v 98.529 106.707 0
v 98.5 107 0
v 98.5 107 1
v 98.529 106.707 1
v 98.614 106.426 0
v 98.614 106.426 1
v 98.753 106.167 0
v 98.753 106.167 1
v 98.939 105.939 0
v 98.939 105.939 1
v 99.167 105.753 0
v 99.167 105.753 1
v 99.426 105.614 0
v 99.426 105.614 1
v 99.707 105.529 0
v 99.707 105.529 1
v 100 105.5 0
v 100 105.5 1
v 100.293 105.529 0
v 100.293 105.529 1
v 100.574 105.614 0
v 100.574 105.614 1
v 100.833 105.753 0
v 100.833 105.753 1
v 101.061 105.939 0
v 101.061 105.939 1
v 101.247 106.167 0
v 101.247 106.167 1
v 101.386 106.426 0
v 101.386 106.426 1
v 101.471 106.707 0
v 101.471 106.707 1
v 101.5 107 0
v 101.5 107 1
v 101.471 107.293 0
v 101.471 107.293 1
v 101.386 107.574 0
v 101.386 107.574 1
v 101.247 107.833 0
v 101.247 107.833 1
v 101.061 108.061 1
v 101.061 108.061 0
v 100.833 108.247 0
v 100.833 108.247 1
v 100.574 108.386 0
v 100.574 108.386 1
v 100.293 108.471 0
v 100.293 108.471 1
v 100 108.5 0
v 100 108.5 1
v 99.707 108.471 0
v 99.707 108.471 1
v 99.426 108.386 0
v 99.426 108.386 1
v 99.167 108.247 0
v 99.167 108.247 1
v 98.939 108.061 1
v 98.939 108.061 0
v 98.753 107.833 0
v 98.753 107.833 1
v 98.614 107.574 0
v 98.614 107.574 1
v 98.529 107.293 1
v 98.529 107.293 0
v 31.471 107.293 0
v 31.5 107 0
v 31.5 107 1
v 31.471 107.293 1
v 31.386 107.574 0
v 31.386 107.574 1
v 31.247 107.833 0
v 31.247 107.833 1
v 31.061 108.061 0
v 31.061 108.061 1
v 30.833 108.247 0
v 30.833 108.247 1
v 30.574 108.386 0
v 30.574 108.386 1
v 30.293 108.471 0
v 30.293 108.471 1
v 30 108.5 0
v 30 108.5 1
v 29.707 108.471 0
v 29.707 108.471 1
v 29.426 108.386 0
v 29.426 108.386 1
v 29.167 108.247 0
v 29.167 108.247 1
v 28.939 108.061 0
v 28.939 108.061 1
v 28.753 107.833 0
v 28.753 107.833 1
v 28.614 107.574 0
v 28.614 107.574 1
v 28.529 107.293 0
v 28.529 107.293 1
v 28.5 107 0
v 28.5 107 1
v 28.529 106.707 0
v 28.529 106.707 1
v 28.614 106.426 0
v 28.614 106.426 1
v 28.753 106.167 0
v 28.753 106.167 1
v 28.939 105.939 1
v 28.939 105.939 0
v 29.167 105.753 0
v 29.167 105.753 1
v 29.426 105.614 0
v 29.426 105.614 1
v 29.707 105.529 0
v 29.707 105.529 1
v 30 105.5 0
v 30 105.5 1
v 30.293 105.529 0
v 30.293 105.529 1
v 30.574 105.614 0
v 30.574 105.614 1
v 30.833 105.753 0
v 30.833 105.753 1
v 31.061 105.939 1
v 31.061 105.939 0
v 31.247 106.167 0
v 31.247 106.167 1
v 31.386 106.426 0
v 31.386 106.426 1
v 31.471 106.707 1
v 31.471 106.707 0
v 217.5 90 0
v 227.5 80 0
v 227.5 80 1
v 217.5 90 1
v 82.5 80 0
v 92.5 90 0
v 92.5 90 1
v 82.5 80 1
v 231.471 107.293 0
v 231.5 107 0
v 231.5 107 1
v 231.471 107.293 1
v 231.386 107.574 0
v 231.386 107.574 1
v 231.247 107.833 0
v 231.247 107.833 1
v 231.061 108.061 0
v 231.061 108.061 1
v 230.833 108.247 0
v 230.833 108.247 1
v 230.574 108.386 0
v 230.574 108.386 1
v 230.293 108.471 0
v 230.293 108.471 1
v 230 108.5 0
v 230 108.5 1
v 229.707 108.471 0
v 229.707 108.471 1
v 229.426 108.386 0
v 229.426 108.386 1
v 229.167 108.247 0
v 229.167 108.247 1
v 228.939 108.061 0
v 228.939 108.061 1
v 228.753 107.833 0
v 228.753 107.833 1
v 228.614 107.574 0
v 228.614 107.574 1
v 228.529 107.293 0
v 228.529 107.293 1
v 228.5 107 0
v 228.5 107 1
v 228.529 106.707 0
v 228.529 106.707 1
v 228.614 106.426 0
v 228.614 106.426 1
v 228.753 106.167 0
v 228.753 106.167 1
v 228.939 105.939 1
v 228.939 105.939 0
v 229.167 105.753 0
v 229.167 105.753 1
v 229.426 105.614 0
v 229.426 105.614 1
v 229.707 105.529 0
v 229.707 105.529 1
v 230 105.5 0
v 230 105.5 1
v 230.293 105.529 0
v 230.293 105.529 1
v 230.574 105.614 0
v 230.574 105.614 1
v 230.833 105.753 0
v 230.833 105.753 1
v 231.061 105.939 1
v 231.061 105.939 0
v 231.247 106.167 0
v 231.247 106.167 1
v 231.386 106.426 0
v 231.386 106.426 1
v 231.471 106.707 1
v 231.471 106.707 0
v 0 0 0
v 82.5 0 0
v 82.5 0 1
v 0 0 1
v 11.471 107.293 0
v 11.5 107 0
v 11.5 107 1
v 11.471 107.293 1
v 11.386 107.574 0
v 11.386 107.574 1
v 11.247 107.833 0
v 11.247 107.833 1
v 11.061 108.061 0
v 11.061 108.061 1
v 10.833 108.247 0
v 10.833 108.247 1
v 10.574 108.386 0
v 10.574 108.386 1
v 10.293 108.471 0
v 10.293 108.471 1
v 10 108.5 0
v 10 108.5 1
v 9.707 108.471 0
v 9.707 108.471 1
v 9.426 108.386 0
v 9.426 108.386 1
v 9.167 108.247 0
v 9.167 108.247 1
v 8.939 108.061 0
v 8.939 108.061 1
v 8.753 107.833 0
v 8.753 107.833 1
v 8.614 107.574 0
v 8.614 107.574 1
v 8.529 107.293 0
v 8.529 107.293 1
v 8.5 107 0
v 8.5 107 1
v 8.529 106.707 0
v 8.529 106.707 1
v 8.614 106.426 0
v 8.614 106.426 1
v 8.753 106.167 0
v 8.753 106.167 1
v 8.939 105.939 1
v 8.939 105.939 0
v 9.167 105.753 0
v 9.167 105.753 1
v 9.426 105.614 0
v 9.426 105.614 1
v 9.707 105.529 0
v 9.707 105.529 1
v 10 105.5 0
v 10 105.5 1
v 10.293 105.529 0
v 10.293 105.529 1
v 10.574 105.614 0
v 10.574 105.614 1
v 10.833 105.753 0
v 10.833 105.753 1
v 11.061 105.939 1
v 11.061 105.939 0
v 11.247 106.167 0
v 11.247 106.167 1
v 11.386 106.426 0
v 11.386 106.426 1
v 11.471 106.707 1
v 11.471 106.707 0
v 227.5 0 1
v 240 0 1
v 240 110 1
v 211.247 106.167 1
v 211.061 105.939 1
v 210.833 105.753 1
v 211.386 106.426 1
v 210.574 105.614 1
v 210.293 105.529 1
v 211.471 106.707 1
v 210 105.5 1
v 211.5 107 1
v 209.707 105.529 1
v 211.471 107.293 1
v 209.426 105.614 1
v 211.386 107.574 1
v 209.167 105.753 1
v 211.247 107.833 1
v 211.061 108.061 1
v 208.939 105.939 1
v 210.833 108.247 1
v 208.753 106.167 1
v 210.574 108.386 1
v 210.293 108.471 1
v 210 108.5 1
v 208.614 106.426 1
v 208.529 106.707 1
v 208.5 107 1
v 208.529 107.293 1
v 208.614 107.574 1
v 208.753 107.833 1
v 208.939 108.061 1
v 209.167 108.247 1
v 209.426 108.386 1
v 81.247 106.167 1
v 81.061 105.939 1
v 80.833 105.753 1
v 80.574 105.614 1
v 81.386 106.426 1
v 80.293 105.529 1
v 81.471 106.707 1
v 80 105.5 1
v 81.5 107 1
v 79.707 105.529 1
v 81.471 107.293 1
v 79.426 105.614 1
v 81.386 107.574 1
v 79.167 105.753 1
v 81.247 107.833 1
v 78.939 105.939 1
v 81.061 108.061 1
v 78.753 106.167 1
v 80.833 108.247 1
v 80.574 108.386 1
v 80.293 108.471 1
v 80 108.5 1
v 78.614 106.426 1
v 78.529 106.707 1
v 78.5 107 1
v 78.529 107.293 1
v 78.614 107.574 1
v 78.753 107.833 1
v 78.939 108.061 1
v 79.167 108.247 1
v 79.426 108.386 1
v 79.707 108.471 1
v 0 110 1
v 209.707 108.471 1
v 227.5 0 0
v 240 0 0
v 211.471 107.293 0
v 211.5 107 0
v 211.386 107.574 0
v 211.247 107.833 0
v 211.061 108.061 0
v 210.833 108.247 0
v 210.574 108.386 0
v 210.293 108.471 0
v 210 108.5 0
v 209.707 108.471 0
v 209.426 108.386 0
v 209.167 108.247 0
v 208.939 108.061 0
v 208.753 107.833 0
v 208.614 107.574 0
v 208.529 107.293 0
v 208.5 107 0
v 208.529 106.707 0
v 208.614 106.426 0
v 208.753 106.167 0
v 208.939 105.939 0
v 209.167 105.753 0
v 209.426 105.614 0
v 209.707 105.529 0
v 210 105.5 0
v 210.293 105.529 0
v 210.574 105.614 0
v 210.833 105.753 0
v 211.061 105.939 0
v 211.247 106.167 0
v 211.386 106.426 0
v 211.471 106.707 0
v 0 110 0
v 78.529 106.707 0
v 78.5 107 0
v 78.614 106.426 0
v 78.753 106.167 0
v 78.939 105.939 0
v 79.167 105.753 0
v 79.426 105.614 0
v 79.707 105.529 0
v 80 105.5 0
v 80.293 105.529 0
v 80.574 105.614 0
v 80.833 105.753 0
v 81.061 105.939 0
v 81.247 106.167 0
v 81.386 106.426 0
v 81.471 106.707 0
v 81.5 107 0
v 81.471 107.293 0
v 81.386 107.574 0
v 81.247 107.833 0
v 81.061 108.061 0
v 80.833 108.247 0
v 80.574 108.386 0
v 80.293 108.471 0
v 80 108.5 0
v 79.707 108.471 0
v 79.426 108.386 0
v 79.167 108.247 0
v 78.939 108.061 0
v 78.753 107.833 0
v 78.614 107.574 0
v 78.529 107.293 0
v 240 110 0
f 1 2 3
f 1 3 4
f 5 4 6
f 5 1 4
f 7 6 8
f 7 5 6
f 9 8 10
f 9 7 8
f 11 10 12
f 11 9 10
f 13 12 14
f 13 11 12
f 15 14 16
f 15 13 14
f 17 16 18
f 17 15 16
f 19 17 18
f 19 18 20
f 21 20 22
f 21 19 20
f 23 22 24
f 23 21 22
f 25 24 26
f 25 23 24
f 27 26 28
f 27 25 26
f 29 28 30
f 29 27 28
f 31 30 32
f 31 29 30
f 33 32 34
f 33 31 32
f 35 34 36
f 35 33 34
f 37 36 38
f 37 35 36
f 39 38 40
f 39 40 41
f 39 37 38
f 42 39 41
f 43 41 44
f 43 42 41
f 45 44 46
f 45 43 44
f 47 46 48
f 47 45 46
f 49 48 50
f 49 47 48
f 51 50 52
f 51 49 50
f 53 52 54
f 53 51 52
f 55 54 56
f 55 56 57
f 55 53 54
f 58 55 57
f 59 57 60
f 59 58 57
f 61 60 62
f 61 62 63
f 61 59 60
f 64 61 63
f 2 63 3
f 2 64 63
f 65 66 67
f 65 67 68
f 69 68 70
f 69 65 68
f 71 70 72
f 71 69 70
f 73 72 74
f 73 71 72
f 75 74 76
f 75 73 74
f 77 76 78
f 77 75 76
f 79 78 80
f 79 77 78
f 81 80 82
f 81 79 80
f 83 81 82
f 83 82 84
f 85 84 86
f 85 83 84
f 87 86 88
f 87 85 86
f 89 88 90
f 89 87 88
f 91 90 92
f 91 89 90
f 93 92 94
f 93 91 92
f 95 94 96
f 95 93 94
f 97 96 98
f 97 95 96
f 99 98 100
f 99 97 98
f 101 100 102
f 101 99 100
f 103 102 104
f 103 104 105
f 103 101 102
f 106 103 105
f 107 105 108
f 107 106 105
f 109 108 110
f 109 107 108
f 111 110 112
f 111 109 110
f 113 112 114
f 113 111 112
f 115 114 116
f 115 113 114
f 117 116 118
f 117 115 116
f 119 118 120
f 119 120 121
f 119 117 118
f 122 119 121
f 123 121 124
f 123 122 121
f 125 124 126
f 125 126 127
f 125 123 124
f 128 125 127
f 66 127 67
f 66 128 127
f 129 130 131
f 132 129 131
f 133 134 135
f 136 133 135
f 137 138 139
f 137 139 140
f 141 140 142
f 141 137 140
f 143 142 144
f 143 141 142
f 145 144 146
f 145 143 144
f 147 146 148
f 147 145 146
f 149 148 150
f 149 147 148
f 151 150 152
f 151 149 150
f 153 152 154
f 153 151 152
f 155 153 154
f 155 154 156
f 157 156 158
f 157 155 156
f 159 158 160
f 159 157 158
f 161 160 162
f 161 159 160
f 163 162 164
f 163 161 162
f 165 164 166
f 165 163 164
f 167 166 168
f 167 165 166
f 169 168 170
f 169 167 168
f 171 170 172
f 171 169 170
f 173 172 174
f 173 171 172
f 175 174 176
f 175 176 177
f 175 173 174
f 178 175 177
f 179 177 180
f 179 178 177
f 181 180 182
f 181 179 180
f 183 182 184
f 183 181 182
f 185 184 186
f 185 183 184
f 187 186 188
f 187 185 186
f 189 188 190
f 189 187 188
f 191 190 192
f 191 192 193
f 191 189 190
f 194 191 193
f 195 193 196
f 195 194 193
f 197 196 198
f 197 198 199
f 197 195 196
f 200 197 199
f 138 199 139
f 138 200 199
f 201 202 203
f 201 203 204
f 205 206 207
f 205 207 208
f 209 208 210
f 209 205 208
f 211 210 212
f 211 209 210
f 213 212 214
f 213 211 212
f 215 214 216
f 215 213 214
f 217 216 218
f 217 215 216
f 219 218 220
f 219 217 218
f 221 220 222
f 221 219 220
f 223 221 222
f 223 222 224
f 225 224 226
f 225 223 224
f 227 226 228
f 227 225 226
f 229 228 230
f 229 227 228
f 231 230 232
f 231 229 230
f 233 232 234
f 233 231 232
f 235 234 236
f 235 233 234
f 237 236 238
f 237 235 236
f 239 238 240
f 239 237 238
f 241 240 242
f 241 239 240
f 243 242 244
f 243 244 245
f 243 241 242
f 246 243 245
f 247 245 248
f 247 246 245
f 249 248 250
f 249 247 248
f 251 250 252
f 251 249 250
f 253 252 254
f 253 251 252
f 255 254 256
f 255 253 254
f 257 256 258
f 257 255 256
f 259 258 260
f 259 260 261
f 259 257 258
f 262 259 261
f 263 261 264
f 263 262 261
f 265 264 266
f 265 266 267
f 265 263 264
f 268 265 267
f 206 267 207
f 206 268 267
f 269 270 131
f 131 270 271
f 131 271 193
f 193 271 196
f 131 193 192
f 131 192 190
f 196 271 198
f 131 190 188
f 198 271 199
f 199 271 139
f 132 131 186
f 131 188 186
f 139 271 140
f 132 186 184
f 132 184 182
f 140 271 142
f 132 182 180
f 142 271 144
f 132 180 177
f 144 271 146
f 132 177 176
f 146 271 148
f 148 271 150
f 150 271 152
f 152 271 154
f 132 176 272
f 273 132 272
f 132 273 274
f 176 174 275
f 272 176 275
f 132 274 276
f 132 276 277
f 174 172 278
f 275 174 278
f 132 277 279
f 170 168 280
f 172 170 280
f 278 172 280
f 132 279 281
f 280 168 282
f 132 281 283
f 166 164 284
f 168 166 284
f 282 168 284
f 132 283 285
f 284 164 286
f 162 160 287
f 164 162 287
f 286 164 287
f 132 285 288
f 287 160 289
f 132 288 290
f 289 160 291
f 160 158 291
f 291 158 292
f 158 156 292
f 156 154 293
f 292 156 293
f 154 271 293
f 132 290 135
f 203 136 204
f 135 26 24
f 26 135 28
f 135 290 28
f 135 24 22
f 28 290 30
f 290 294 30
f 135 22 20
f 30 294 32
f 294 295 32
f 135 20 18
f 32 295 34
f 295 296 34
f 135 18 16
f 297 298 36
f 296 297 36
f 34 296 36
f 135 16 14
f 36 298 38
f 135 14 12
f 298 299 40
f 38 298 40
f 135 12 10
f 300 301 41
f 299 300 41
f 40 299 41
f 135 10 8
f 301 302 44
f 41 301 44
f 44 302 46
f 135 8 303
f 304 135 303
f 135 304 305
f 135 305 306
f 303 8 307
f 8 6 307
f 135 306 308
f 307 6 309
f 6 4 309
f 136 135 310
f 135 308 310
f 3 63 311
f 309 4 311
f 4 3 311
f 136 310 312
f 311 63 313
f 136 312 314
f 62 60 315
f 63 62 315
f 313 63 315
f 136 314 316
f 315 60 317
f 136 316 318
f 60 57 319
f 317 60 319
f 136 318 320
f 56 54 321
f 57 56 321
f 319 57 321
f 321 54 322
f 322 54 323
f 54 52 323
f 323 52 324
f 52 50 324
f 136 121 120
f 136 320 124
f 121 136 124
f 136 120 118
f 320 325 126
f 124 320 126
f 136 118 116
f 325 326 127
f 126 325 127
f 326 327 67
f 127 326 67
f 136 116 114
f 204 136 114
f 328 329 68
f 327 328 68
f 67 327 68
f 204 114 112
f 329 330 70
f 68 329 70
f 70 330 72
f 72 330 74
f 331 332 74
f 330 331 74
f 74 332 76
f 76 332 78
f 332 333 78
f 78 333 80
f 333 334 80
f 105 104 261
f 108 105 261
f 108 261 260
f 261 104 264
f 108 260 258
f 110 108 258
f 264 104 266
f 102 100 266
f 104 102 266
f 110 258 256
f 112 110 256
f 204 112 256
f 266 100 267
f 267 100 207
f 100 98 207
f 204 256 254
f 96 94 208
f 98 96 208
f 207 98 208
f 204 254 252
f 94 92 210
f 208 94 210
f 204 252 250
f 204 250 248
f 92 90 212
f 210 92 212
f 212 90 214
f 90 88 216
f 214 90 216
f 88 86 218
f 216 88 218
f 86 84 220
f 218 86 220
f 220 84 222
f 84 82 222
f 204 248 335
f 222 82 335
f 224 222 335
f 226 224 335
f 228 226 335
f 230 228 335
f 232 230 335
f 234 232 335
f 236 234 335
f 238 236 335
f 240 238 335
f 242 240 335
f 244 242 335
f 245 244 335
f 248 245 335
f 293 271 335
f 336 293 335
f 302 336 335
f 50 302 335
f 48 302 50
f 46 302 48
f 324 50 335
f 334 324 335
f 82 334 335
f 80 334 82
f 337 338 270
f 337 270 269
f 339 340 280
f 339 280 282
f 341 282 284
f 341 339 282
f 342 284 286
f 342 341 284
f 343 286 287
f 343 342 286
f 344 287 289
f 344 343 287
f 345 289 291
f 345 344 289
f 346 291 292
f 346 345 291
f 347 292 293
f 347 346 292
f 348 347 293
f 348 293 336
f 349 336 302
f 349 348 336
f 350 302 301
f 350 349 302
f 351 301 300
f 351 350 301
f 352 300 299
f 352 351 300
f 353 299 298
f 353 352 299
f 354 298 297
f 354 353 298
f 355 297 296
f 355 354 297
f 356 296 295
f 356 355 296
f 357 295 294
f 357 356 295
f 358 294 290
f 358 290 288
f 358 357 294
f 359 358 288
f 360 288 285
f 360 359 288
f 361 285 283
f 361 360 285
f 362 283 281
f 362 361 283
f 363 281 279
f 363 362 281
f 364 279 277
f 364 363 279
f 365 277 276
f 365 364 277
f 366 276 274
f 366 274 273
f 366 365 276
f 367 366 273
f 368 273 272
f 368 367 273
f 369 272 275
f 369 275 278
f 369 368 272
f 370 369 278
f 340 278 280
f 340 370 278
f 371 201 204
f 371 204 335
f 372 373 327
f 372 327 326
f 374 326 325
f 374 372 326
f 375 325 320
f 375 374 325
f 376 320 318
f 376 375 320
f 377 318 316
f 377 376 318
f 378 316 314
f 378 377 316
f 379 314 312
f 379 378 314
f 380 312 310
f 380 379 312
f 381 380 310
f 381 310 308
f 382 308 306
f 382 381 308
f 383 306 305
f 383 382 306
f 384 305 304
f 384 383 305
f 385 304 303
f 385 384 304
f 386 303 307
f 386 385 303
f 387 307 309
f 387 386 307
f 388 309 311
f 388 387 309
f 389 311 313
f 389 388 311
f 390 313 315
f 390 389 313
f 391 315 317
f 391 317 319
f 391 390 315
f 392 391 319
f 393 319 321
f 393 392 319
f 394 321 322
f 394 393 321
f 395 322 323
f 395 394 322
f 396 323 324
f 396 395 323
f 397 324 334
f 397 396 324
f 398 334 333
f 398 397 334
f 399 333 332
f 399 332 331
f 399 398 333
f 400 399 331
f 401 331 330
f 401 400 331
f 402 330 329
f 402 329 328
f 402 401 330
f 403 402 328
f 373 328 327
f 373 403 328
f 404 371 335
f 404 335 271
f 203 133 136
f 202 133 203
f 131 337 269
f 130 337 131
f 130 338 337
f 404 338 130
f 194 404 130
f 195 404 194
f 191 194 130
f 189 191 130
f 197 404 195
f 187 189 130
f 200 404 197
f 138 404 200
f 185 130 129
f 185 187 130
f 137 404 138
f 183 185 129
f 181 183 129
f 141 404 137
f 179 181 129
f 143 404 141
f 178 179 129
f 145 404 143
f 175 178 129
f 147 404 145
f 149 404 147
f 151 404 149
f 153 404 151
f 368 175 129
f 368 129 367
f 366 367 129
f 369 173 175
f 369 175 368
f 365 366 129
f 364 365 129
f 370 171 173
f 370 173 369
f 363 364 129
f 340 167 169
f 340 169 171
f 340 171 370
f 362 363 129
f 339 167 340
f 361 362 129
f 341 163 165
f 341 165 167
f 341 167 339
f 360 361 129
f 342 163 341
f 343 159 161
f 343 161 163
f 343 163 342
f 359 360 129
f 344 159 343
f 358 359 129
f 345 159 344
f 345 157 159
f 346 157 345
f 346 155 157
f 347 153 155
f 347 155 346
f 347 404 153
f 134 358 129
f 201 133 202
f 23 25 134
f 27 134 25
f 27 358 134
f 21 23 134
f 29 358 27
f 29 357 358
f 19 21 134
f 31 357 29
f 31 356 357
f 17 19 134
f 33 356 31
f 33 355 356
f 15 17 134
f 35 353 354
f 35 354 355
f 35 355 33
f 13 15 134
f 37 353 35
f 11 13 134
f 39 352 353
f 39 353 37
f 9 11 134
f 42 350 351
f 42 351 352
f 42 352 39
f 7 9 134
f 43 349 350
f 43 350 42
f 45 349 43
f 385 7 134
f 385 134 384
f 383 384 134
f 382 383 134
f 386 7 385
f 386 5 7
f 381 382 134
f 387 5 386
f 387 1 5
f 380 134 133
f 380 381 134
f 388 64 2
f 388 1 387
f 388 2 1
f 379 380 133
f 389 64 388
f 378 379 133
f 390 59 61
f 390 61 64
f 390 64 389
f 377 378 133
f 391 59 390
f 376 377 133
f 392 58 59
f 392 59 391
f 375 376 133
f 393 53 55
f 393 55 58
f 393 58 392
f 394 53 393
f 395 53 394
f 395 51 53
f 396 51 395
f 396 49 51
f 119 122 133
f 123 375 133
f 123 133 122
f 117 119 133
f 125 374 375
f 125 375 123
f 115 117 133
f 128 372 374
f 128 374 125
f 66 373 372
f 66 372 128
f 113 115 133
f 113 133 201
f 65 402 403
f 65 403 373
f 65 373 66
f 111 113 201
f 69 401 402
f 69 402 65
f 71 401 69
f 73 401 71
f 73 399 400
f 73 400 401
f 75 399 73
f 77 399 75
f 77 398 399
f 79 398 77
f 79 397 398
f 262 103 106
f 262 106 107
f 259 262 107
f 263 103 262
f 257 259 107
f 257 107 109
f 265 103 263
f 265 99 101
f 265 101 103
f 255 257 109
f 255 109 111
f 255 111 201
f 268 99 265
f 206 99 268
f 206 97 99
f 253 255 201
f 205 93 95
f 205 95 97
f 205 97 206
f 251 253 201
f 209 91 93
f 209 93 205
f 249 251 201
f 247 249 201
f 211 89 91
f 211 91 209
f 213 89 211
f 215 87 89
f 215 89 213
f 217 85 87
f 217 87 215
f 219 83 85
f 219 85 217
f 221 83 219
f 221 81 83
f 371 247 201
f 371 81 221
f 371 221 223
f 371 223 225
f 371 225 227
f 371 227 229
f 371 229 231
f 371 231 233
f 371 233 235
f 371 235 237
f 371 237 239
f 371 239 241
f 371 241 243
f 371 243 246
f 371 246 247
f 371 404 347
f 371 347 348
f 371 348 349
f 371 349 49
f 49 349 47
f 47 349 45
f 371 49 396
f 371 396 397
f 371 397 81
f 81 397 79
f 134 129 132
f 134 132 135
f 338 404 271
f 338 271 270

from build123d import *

# Parameters (mm, degrees)
SKETCH_1_R      = 1.5
EXTRUDE_1_DEPTH = 1
CHAMFER_1_SIZE  = 10


with BuildPart() as part:
    # 草图1 → 凸台-拉伸1 (new body)
    with BuildSketch(Plane.XY):
        Polygon((0, 0), (0, 110), (240, 110), (240, 0), (227.5, 0), (227.5, 90), (82.5, 90), (82.5, 0), align=None)
        with Locations((10, 107)):
            Circle(SKETCH_1_R, mode=Mode.SUBTRACT)
        with Locations((30, 107)):
            Circle(SKETCH_1_R, mode=Mode.SUBTRACT)
        with Locations((210, 107)):
            Circle(SKETCH_1_R, mode=Mode.SUBTRACT)
        with Locations((230, 107)):
            Circle(SKETCH_1_R, mode=Mode.SUBTRACT)
        with Locations(Location((80, 107, 0), (0, 0, 180))):
            Circle(SKETCH_1_R, mode=Mode.SUBTRACT)
        with Locations(Location((100, 107, 0), (0, 0, 180))):
            Circle(SKETCH_1_R, mode=Mode.SUBTRACT)
    extrude(amount=EXTRUDE_1_DEPTH)

    # 倒角1
    chamfer_1_edges = [part.edges().sort_by_distance(p)[0] for p in [
        (227.5, 90, 0.5),
        (82.5, 90, 0.5),
    ]]
    chamfer(chamfer_1_edges, length=CHAMFER_1_SIZE)


solid = part.part
